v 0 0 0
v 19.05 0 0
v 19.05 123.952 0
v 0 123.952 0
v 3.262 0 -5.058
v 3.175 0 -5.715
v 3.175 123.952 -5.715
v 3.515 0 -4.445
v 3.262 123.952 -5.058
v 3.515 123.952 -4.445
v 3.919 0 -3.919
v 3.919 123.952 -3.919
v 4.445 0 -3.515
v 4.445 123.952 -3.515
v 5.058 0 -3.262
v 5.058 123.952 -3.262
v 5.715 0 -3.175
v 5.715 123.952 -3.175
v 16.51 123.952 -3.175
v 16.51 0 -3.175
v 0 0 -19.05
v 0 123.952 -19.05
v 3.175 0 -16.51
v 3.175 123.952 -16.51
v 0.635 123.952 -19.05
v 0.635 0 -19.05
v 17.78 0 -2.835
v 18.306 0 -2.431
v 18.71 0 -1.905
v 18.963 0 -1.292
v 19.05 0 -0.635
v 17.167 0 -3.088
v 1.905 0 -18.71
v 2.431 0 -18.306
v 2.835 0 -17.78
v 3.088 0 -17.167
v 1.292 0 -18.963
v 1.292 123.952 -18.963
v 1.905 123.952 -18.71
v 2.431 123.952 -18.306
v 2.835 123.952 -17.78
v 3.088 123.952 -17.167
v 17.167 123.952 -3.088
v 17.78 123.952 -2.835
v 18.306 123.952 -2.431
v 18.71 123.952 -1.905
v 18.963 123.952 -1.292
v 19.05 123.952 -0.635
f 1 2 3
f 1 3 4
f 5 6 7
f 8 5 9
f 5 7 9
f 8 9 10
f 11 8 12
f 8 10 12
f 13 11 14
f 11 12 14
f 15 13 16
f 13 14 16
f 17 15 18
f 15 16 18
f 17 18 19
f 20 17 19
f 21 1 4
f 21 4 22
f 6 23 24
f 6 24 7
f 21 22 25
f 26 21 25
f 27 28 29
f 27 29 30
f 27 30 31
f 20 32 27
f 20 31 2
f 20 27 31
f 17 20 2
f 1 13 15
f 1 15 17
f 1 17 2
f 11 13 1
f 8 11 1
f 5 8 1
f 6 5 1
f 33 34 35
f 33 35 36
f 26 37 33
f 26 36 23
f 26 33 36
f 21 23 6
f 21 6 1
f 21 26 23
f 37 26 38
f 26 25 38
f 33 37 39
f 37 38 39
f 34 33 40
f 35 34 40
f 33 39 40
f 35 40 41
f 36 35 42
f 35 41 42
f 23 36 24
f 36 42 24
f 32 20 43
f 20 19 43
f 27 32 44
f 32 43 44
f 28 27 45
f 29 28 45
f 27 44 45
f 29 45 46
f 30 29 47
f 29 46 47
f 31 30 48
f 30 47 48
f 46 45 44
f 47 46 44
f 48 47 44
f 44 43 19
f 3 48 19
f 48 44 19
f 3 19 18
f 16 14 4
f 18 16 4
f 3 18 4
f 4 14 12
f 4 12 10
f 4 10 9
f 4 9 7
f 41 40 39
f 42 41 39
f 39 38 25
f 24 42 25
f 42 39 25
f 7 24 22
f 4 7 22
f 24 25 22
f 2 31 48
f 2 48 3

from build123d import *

# Parameters (mm, degrees)
BOSS_EXTRUDE1_DEPTH = 123.952
FILLET1_R           = 2.54


with BuildPart() as part:
    # Sketch1 → Boss-Extrude1 (new body)
    with BuildSketch(Plane(origin=(0, 0, 0), x_dir=(1, 0, 0), z_dir=(0, 1, 0))):
        Polygon((0, 0), (0, 19.05), (3.175, 19.05), (3.175, 3.175), (19.05, 3.175), (19.05, 0), align=None)
    extrude(amount=BOSS_EXTRUDE1_DEPTH)

    # Fillet1
    fillet1_edges = [part.edges().sort_by_distance(p)[0] for p in [
        (3.175, 61.976, -19.05),
        (3.175, 61.976, -3.175),
        (19.05, 61.976, -3.175),
    ]]
    fillet(fillet1_edges, radius=FILLET1_R)


solid = part.part
